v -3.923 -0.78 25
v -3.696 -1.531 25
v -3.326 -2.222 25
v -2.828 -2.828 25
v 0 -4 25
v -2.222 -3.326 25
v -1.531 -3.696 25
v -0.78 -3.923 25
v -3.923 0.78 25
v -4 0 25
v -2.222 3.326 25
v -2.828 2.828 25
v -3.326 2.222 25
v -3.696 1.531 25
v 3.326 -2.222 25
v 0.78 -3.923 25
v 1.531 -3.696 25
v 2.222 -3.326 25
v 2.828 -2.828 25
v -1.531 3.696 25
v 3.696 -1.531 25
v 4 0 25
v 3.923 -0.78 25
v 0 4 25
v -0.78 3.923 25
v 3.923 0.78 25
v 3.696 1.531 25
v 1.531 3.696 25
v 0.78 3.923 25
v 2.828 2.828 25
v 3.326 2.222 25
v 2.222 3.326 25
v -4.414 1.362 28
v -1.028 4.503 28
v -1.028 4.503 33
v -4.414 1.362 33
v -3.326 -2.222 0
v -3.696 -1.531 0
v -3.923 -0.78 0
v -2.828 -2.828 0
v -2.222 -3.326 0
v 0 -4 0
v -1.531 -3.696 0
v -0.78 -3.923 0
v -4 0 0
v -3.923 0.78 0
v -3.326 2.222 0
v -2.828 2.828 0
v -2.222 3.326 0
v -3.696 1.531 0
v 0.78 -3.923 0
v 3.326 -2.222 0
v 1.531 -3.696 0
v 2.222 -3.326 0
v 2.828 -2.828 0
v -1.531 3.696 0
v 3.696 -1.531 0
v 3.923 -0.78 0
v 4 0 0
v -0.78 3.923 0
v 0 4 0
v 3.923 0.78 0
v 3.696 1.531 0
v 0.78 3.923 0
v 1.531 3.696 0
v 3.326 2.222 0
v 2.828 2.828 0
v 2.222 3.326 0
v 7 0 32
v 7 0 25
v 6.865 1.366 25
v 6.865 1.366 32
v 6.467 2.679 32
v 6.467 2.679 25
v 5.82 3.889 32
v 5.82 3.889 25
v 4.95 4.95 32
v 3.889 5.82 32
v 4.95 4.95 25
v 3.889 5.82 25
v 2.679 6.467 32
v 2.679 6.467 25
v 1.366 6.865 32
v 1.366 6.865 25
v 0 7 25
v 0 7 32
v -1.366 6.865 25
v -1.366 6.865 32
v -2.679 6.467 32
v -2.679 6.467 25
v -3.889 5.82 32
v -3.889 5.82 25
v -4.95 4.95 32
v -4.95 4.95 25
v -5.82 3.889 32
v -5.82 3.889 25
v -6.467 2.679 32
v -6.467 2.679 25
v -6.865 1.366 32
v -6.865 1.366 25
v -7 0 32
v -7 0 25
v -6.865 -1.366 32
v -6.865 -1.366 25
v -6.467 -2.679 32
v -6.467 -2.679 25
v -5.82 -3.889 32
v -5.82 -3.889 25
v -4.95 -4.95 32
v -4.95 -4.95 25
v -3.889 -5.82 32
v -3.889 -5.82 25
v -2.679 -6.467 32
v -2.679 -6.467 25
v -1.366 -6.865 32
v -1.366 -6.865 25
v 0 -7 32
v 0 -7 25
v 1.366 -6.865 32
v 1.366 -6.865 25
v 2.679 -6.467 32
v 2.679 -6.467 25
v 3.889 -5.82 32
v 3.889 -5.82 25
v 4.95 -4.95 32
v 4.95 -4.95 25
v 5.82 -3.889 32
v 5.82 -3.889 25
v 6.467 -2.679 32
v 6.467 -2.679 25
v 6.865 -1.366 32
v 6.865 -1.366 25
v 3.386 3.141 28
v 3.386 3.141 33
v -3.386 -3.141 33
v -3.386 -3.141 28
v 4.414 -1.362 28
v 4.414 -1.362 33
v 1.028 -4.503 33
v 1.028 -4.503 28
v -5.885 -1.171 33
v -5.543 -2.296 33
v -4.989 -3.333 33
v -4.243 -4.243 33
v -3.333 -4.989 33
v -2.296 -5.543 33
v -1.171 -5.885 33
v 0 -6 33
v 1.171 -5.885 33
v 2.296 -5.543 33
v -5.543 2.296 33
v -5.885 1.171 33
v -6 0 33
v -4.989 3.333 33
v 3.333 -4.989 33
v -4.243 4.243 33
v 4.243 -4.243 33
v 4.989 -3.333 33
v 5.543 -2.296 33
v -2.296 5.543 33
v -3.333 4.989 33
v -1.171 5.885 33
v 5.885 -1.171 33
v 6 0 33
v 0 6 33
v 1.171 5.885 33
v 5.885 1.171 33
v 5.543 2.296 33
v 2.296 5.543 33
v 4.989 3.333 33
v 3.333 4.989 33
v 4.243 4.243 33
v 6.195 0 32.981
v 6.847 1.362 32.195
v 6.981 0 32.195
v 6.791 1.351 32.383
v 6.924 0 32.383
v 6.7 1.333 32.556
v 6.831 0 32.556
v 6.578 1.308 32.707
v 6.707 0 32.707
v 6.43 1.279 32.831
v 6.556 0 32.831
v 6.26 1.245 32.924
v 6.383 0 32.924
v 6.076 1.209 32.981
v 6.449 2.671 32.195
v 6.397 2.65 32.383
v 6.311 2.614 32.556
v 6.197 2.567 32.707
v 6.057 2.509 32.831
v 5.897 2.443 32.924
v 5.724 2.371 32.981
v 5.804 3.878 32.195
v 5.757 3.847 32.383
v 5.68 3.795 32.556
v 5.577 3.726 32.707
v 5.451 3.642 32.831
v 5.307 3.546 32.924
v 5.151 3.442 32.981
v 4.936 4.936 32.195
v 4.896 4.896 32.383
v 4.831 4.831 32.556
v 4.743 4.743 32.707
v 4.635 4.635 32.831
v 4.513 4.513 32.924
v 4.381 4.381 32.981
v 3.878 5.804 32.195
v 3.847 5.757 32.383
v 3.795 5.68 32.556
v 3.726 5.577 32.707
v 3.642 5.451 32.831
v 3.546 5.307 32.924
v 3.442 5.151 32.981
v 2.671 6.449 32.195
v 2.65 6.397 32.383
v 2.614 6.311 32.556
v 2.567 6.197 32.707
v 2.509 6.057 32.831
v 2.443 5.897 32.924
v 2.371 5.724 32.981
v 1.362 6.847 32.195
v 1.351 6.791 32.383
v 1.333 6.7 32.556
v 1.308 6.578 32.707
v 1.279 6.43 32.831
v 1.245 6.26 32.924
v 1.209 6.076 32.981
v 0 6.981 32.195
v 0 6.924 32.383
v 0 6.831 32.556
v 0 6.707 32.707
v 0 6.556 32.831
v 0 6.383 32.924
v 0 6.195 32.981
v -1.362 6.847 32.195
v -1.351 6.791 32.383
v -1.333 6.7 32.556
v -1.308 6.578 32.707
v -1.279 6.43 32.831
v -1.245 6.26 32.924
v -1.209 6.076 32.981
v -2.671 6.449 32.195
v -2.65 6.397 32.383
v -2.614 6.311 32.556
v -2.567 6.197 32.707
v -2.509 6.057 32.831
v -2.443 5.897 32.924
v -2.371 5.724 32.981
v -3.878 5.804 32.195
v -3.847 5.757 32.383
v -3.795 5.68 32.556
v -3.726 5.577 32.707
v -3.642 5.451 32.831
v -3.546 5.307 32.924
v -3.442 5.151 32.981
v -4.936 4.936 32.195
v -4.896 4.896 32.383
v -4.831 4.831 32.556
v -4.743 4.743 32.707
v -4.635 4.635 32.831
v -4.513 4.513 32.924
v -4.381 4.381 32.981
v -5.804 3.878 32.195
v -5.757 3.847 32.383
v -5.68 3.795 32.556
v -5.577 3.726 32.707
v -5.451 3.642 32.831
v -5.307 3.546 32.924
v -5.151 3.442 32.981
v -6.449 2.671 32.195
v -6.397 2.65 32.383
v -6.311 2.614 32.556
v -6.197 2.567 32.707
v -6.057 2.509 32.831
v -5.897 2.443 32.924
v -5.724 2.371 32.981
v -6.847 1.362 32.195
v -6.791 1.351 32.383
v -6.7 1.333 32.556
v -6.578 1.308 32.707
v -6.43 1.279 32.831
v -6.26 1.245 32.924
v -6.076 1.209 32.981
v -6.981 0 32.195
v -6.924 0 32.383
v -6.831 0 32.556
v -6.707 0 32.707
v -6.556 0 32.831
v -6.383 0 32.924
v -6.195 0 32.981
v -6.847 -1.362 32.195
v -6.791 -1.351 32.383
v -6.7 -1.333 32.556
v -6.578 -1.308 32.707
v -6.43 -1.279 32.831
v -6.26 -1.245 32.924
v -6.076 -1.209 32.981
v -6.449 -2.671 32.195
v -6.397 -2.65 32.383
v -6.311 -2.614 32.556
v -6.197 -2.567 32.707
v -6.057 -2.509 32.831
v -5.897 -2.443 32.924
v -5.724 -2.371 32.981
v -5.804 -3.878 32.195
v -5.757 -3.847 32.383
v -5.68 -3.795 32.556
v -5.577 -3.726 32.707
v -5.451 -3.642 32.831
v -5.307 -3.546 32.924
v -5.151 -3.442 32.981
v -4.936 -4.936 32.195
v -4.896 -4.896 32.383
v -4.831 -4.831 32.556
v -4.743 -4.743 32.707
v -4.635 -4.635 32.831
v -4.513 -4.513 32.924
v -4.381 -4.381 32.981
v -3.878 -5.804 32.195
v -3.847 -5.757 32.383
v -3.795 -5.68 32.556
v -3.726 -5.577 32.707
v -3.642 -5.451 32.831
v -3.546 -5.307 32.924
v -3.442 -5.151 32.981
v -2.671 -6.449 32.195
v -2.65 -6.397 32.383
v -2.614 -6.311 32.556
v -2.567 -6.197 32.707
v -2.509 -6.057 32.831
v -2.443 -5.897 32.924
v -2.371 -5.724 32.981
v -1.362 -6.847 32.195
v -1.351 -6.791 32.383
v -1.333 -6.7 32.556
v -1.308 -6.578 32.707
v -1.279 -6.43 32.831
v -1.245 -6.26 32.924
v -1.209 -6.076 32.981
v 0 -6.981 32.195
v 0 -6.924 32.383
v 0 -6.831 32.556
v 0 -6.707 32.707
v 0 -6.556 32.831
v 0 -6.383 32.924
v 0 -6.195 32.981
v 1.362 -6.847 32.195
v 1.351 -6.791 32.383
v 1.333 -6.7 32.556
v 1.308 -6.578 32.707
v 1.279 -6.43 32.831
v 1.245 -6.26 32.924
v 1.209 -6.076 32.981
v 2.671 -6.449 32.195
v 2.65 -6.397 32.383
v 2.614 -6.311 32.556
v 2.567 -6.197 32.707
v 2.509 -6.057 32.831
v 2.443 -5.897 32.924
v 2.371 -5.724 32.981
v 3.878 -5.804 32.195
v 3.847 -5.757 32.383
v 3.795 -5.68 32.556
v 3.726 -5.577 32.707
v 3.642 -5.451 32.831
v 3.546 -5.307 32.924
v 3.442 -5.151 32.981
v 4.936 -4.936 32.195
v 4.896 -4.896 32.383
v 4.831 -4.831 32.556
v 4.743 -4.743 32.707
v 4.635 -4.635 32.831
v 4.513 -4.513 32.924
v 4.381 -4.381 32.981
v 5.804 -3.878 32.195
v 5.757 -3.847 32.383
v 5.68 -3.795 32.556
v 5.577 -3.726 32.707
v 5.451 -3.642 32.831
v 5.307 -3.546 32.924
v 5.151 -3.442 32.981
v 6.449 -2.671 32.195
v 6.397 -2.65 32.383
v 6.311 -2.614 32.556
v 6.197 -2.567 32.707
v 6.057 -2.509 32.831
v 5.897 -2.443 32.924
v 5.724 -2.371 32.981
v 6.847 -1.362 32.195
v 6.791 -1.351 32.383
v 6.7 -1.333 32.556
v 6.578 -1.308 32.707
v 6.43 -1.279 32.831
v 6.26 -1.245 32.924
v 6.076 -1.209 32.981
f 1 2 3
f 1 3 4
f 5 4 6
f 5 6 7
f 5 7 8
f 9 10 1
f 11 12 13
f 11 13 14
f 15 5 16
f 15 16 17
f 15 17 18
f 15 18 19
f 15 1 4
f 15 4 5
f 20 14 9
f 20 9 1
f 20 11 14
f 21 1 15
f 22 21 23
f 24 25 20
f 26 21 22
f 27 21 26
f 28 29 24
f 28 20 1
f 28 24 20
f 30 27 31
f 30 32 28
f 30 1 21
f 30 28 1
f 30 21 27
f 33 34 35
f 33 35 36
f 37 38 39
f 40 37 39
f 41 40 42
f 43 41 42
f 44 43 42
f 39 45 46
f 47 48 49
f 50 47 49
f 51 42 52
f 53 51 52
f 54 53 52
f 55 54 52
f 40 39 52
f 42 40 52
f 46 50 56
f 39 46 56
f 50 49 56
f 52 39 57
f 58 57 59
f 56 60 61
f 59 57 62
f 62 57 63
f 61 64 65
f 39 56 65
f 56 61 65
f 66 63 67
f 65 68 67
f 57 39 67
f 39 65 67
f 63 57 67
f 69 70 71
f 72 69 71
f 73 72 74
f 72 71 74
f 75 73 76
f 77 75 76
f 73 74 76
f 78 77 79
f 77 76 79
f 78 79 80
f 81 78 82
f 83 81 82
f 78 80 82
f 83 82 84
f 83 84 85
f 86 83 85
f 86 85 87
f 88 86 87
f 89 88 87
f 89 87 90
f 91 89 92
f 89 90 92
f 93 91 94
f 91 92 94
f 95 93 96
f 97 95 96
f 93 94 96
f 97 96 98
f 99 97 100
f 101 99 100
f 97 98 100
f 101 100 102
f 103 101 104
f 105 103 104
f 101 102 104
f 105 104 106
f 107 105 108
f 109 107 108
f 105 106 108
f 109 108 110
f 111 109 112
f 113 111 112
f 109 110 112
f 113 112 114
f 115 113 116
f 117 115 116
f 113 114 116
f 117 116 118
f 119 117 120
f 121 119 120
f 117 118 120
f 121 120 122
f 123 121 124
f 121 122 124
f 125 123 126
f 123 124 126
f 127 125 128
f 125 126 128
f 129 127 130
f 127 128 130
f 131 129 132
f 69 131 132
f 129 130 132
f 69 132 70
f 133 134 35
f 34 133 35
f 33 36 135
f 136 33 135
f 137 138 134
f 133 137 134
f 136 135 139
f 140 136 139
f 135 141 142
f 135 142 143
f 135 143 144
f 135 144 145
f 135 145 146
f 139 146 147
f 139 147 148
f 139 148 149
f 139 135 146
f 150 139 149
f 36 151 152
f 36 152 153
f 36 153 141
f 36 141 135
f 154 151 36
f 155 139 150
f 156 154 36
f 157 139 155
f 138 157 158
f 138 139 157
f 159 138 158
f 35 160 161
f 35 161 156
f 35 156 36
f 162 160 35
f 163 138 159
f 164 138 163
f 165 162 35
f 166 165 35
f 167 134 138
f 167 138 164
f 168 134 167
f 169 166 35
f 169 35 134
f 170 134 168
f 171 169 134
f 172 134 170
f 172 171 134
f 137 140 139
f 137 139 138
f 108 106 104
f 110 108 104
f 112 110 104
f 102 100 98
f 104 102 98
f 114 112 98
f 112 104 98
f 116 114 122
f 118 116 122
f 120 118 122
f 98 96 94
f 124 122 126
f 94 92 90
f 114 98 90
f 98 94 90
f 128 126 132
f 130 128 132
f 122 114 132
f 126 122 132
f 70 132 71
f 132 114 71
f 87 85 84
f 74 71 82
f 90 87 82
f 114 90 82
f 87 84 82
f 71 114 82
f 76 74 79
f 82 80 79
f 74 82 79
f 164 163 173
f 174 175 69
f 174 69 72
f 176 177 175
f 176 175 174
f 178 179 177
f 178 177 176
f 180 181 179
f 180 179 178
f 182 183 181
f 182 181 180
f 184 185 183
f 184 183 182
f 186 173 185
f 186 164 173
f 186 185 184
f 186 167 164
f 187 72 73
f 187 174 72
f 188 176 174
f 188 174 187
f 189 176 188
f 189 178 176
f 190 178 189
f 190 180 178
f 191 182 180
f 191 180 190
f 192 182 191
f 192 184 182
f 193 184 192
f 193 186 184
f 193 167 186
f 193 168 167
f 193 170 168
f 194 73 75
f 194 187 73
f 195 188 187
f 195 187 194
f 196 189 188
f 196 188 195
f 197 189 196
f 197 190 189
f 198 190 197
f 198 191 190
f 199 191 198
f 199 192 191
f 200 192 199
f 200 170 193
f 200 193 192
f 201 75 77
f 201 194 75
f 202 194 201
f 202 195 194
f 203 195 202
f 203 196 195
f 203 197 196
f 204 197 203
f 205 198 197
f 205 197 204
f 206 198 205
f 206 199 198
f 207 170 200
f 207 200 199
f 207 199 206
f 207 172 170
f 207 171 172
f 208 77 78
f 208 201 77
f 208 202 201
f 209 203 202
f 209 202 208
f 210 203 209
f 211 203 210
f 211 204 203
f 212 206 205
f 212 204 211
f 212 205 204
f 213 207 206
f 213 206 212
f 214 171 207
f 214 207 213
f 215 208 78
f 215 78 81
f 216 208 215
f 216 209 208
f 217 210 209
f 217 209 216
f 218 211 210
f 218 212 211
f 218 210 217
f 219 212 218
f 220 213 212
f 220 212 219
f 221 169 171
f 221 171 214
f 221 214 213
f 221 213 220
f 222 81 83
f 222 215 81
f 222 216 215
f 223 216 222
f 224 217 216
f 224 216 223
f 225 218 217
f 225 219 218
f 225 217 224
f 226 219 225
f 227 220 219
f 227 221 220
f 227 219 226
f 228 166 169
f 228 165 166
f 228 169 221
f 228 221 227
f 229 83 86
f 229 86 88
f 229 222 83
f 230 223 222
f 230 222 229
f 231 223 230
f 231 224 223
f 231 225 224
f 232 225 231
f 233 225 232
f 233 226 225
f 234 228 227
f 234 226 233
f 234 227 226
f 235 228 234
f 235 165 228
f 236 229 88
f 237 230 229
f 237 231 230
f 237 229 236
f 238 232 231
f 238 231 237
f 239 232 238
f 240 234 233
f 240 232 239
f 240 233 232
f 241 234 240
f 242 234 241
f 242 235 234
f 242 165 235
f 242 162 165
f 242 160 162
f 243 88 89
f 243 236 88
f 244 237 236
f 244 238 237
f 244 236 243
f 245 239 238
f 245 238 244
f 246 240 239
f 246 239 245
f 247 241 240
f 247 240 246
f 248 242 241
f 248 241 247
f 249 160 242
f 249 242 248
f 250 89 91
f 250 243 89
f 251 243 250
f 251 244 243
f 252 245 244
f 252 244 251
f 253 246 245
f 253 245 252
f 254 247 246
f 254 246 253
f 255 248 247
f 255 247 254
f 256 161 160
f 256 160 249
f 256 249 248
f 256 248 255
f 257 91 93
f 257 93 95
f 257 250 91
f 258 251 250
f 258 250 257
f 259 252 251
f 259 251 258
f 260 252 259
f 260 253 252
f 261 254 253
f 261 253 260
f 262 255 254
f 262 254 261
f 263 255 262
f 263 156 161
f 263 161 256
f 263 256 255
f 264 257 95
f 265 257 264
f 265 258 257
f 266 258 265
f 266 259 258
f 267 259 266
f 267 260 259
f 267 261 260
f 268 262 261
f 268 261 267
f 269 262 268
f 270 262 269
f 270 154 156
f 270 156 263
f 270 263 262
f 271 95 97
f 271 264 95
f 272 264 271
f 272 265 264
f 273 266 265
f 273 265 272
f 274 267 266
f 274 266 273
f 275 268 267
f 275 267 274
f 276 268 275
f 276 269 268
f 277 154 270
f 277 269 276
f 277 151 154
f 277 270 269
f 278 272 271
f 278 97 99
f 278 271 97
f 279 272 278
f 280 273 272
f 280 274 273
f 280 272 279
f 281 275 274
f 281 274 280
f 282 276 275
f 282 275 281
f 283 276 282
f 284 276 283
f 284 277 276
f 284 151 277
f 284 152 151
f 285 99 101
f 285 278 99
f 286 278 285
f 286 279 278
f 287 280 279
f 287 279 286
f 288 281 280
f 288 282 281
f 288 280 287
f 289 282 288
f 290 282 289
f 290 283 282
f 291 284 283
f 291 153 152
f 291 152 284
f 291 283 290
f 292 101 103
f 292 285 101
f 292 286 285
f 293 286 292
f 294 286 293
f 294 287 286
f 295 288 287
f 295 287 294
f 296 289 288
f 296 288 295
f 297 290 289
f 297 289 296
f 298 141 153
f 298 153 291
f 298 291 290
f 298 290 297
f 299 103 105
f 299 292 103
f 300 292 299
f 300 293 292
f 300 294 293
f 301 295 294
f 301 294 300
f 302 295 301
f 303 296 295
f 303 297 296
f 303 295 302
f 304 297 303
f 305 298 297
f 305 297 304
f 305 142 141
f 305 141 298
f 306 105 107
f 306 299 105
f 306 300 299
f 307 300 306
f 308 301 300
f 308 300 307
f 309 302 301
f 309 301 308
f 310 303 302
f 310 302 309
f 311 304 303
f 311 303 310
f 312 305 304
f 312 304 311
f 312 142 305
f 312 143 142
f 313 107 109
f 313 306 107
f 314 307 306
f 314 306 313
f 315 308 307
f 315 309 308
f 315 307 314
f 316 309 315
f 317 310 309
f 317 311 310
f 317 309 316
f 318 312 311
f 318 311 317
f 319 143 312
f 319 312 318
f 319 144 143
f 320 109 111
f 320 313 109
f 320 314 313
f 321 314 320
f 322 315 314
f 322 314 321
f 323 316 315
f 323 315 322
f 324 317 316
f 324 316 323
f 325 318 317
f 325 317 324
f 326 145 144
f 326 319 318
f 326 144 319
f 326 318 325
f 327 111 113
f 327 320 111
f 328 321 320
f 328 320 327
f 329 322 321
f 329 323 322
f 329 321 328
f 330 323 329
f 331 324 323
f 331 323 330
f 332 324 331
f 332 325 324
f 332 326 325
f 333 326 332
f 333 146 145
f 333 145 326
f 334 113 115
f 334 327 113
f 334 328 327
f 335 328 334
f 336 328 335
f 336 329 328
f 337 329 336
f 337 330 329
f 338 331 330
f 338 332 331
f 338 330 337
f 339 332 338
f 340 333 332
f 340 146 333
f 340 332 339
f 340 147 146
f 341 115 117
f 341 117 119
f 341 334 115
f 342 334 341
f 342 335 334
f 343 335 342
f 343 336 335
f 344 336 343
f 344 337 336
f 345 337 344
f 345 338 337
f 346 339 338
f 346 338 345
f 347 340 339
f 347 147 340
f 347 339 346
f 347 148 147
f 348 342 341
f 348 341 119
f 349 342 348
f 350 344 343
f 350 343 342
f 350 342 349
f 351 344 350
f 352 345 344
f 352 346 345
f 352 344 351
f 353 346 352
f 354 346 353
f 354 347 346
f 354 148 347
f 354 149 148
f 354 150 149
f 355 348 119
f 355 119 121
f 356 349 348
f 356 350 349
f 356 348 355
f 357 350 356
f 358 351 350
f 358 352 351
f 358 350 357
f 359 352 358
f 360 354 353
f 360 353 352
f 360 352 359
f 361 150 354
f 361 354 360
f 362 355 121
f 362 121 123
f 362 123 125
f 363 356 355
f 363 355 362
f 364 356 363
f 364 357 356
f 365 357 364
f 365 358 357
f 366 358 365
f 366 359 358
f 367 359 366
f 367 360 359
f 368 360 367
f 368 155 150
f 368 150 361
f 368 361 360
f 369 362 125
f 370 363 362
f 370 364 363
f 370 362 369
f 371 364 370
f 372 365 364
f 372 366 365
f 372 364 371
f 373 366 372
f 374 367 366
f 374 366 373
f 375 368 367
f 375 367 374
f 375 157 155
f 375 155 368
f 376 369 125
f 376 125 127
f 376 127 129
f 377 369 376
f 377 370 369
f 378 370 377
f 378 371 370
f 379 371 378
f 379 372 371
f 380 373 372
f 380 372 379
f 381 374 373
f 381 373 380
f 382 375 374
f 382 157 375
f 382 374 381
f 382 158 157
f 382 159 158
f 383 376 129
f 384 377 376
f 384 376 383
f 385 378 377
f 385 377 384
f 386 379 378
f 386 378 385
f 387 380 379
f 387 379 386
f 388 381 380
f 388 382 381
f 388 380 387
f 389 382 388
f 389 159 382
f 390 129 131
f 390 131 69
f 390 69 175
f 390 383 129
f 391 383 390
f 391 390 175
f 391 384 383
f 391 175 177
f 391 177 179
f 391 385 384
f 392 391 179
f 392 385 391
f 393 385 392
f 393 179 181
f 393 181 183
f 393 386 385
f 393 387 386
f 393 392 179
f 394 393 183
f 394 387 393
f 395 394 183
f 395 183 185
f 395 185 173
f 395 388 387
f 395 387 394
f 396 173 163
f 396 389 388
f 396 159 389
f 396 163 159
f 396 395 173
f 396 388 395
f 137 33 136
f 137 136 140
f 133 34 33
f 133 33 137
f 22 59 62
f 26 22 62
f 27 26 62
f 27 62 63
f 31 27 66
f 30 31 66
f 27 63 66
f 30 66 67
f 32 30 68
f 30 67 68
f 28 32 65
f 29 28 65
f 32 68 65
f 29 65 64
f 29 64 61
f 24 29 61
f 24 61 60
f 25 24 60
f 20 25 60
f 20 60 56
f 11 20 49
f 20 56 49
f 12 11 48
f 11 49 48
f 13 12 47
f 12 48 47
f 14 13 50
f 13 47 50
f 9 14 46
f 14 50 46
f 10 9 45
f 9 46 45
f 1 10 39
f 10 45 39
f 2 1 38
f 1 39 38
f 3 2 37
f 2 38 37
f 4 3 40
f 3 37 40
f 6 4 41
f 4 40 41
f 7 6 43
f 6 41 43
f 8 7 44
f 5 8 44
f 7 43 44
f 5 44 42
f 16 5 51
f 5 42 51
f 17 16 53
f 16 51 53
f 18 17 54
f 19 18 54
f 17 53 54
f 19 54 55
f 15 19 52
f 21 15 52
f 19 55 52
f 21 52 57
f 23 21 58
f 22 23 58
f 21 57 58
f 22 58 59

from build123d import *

# Parameters (mm, degrees)
F0_R     = 4
F4_DEPTH = 25
F1_R     = 7
F1_R_2   = 4
F5_DEPTH = 8
F2_DEPTH = 5
F3_R     = 1


with BuildPart() as f4:
    # F0 (on Top) → F4 (new body)
    with BuildSketch(Plane.XY):
        Circle(F0_R)
    extrude(amount=F4_DEPTH)


with BuildPart() as f5:
    # F1 (on face) → F5 (new body)
    with BuildSketch(Plane.XY.offset(25)):
        Circle(F1_R)
        Circle(F1_R_2, mode=Mode.SUBTRACT)
        Circle(F1_R_2)
    extrude(amount=F5_DEPTH)

    # F6 (on face) → F2 (cut)
    with BuildSketch(Plane.XY.offset(33)):
        Polygon((1.0275741013, -4.503046169), (4.4135394274, -1.3616178085), (3.3859653261, 3.1414283605), (-1.0275741013, 4.503046169), (-4.4135394274, 1.3616178085), (-3.3859653261, -3.1414283605), align=None)
    extrude(amount=-F2_DEPTH, mode=Mode.SUBTRACT)

    # F3
    f3_edges = [f5.edges().sort_by_distance(p)[0] for p in [
        (-7, 0, 33),
    ]]
    fillet(f3_edges, radius=F3_R)


solid = Compound([f4.part, f5.part])
